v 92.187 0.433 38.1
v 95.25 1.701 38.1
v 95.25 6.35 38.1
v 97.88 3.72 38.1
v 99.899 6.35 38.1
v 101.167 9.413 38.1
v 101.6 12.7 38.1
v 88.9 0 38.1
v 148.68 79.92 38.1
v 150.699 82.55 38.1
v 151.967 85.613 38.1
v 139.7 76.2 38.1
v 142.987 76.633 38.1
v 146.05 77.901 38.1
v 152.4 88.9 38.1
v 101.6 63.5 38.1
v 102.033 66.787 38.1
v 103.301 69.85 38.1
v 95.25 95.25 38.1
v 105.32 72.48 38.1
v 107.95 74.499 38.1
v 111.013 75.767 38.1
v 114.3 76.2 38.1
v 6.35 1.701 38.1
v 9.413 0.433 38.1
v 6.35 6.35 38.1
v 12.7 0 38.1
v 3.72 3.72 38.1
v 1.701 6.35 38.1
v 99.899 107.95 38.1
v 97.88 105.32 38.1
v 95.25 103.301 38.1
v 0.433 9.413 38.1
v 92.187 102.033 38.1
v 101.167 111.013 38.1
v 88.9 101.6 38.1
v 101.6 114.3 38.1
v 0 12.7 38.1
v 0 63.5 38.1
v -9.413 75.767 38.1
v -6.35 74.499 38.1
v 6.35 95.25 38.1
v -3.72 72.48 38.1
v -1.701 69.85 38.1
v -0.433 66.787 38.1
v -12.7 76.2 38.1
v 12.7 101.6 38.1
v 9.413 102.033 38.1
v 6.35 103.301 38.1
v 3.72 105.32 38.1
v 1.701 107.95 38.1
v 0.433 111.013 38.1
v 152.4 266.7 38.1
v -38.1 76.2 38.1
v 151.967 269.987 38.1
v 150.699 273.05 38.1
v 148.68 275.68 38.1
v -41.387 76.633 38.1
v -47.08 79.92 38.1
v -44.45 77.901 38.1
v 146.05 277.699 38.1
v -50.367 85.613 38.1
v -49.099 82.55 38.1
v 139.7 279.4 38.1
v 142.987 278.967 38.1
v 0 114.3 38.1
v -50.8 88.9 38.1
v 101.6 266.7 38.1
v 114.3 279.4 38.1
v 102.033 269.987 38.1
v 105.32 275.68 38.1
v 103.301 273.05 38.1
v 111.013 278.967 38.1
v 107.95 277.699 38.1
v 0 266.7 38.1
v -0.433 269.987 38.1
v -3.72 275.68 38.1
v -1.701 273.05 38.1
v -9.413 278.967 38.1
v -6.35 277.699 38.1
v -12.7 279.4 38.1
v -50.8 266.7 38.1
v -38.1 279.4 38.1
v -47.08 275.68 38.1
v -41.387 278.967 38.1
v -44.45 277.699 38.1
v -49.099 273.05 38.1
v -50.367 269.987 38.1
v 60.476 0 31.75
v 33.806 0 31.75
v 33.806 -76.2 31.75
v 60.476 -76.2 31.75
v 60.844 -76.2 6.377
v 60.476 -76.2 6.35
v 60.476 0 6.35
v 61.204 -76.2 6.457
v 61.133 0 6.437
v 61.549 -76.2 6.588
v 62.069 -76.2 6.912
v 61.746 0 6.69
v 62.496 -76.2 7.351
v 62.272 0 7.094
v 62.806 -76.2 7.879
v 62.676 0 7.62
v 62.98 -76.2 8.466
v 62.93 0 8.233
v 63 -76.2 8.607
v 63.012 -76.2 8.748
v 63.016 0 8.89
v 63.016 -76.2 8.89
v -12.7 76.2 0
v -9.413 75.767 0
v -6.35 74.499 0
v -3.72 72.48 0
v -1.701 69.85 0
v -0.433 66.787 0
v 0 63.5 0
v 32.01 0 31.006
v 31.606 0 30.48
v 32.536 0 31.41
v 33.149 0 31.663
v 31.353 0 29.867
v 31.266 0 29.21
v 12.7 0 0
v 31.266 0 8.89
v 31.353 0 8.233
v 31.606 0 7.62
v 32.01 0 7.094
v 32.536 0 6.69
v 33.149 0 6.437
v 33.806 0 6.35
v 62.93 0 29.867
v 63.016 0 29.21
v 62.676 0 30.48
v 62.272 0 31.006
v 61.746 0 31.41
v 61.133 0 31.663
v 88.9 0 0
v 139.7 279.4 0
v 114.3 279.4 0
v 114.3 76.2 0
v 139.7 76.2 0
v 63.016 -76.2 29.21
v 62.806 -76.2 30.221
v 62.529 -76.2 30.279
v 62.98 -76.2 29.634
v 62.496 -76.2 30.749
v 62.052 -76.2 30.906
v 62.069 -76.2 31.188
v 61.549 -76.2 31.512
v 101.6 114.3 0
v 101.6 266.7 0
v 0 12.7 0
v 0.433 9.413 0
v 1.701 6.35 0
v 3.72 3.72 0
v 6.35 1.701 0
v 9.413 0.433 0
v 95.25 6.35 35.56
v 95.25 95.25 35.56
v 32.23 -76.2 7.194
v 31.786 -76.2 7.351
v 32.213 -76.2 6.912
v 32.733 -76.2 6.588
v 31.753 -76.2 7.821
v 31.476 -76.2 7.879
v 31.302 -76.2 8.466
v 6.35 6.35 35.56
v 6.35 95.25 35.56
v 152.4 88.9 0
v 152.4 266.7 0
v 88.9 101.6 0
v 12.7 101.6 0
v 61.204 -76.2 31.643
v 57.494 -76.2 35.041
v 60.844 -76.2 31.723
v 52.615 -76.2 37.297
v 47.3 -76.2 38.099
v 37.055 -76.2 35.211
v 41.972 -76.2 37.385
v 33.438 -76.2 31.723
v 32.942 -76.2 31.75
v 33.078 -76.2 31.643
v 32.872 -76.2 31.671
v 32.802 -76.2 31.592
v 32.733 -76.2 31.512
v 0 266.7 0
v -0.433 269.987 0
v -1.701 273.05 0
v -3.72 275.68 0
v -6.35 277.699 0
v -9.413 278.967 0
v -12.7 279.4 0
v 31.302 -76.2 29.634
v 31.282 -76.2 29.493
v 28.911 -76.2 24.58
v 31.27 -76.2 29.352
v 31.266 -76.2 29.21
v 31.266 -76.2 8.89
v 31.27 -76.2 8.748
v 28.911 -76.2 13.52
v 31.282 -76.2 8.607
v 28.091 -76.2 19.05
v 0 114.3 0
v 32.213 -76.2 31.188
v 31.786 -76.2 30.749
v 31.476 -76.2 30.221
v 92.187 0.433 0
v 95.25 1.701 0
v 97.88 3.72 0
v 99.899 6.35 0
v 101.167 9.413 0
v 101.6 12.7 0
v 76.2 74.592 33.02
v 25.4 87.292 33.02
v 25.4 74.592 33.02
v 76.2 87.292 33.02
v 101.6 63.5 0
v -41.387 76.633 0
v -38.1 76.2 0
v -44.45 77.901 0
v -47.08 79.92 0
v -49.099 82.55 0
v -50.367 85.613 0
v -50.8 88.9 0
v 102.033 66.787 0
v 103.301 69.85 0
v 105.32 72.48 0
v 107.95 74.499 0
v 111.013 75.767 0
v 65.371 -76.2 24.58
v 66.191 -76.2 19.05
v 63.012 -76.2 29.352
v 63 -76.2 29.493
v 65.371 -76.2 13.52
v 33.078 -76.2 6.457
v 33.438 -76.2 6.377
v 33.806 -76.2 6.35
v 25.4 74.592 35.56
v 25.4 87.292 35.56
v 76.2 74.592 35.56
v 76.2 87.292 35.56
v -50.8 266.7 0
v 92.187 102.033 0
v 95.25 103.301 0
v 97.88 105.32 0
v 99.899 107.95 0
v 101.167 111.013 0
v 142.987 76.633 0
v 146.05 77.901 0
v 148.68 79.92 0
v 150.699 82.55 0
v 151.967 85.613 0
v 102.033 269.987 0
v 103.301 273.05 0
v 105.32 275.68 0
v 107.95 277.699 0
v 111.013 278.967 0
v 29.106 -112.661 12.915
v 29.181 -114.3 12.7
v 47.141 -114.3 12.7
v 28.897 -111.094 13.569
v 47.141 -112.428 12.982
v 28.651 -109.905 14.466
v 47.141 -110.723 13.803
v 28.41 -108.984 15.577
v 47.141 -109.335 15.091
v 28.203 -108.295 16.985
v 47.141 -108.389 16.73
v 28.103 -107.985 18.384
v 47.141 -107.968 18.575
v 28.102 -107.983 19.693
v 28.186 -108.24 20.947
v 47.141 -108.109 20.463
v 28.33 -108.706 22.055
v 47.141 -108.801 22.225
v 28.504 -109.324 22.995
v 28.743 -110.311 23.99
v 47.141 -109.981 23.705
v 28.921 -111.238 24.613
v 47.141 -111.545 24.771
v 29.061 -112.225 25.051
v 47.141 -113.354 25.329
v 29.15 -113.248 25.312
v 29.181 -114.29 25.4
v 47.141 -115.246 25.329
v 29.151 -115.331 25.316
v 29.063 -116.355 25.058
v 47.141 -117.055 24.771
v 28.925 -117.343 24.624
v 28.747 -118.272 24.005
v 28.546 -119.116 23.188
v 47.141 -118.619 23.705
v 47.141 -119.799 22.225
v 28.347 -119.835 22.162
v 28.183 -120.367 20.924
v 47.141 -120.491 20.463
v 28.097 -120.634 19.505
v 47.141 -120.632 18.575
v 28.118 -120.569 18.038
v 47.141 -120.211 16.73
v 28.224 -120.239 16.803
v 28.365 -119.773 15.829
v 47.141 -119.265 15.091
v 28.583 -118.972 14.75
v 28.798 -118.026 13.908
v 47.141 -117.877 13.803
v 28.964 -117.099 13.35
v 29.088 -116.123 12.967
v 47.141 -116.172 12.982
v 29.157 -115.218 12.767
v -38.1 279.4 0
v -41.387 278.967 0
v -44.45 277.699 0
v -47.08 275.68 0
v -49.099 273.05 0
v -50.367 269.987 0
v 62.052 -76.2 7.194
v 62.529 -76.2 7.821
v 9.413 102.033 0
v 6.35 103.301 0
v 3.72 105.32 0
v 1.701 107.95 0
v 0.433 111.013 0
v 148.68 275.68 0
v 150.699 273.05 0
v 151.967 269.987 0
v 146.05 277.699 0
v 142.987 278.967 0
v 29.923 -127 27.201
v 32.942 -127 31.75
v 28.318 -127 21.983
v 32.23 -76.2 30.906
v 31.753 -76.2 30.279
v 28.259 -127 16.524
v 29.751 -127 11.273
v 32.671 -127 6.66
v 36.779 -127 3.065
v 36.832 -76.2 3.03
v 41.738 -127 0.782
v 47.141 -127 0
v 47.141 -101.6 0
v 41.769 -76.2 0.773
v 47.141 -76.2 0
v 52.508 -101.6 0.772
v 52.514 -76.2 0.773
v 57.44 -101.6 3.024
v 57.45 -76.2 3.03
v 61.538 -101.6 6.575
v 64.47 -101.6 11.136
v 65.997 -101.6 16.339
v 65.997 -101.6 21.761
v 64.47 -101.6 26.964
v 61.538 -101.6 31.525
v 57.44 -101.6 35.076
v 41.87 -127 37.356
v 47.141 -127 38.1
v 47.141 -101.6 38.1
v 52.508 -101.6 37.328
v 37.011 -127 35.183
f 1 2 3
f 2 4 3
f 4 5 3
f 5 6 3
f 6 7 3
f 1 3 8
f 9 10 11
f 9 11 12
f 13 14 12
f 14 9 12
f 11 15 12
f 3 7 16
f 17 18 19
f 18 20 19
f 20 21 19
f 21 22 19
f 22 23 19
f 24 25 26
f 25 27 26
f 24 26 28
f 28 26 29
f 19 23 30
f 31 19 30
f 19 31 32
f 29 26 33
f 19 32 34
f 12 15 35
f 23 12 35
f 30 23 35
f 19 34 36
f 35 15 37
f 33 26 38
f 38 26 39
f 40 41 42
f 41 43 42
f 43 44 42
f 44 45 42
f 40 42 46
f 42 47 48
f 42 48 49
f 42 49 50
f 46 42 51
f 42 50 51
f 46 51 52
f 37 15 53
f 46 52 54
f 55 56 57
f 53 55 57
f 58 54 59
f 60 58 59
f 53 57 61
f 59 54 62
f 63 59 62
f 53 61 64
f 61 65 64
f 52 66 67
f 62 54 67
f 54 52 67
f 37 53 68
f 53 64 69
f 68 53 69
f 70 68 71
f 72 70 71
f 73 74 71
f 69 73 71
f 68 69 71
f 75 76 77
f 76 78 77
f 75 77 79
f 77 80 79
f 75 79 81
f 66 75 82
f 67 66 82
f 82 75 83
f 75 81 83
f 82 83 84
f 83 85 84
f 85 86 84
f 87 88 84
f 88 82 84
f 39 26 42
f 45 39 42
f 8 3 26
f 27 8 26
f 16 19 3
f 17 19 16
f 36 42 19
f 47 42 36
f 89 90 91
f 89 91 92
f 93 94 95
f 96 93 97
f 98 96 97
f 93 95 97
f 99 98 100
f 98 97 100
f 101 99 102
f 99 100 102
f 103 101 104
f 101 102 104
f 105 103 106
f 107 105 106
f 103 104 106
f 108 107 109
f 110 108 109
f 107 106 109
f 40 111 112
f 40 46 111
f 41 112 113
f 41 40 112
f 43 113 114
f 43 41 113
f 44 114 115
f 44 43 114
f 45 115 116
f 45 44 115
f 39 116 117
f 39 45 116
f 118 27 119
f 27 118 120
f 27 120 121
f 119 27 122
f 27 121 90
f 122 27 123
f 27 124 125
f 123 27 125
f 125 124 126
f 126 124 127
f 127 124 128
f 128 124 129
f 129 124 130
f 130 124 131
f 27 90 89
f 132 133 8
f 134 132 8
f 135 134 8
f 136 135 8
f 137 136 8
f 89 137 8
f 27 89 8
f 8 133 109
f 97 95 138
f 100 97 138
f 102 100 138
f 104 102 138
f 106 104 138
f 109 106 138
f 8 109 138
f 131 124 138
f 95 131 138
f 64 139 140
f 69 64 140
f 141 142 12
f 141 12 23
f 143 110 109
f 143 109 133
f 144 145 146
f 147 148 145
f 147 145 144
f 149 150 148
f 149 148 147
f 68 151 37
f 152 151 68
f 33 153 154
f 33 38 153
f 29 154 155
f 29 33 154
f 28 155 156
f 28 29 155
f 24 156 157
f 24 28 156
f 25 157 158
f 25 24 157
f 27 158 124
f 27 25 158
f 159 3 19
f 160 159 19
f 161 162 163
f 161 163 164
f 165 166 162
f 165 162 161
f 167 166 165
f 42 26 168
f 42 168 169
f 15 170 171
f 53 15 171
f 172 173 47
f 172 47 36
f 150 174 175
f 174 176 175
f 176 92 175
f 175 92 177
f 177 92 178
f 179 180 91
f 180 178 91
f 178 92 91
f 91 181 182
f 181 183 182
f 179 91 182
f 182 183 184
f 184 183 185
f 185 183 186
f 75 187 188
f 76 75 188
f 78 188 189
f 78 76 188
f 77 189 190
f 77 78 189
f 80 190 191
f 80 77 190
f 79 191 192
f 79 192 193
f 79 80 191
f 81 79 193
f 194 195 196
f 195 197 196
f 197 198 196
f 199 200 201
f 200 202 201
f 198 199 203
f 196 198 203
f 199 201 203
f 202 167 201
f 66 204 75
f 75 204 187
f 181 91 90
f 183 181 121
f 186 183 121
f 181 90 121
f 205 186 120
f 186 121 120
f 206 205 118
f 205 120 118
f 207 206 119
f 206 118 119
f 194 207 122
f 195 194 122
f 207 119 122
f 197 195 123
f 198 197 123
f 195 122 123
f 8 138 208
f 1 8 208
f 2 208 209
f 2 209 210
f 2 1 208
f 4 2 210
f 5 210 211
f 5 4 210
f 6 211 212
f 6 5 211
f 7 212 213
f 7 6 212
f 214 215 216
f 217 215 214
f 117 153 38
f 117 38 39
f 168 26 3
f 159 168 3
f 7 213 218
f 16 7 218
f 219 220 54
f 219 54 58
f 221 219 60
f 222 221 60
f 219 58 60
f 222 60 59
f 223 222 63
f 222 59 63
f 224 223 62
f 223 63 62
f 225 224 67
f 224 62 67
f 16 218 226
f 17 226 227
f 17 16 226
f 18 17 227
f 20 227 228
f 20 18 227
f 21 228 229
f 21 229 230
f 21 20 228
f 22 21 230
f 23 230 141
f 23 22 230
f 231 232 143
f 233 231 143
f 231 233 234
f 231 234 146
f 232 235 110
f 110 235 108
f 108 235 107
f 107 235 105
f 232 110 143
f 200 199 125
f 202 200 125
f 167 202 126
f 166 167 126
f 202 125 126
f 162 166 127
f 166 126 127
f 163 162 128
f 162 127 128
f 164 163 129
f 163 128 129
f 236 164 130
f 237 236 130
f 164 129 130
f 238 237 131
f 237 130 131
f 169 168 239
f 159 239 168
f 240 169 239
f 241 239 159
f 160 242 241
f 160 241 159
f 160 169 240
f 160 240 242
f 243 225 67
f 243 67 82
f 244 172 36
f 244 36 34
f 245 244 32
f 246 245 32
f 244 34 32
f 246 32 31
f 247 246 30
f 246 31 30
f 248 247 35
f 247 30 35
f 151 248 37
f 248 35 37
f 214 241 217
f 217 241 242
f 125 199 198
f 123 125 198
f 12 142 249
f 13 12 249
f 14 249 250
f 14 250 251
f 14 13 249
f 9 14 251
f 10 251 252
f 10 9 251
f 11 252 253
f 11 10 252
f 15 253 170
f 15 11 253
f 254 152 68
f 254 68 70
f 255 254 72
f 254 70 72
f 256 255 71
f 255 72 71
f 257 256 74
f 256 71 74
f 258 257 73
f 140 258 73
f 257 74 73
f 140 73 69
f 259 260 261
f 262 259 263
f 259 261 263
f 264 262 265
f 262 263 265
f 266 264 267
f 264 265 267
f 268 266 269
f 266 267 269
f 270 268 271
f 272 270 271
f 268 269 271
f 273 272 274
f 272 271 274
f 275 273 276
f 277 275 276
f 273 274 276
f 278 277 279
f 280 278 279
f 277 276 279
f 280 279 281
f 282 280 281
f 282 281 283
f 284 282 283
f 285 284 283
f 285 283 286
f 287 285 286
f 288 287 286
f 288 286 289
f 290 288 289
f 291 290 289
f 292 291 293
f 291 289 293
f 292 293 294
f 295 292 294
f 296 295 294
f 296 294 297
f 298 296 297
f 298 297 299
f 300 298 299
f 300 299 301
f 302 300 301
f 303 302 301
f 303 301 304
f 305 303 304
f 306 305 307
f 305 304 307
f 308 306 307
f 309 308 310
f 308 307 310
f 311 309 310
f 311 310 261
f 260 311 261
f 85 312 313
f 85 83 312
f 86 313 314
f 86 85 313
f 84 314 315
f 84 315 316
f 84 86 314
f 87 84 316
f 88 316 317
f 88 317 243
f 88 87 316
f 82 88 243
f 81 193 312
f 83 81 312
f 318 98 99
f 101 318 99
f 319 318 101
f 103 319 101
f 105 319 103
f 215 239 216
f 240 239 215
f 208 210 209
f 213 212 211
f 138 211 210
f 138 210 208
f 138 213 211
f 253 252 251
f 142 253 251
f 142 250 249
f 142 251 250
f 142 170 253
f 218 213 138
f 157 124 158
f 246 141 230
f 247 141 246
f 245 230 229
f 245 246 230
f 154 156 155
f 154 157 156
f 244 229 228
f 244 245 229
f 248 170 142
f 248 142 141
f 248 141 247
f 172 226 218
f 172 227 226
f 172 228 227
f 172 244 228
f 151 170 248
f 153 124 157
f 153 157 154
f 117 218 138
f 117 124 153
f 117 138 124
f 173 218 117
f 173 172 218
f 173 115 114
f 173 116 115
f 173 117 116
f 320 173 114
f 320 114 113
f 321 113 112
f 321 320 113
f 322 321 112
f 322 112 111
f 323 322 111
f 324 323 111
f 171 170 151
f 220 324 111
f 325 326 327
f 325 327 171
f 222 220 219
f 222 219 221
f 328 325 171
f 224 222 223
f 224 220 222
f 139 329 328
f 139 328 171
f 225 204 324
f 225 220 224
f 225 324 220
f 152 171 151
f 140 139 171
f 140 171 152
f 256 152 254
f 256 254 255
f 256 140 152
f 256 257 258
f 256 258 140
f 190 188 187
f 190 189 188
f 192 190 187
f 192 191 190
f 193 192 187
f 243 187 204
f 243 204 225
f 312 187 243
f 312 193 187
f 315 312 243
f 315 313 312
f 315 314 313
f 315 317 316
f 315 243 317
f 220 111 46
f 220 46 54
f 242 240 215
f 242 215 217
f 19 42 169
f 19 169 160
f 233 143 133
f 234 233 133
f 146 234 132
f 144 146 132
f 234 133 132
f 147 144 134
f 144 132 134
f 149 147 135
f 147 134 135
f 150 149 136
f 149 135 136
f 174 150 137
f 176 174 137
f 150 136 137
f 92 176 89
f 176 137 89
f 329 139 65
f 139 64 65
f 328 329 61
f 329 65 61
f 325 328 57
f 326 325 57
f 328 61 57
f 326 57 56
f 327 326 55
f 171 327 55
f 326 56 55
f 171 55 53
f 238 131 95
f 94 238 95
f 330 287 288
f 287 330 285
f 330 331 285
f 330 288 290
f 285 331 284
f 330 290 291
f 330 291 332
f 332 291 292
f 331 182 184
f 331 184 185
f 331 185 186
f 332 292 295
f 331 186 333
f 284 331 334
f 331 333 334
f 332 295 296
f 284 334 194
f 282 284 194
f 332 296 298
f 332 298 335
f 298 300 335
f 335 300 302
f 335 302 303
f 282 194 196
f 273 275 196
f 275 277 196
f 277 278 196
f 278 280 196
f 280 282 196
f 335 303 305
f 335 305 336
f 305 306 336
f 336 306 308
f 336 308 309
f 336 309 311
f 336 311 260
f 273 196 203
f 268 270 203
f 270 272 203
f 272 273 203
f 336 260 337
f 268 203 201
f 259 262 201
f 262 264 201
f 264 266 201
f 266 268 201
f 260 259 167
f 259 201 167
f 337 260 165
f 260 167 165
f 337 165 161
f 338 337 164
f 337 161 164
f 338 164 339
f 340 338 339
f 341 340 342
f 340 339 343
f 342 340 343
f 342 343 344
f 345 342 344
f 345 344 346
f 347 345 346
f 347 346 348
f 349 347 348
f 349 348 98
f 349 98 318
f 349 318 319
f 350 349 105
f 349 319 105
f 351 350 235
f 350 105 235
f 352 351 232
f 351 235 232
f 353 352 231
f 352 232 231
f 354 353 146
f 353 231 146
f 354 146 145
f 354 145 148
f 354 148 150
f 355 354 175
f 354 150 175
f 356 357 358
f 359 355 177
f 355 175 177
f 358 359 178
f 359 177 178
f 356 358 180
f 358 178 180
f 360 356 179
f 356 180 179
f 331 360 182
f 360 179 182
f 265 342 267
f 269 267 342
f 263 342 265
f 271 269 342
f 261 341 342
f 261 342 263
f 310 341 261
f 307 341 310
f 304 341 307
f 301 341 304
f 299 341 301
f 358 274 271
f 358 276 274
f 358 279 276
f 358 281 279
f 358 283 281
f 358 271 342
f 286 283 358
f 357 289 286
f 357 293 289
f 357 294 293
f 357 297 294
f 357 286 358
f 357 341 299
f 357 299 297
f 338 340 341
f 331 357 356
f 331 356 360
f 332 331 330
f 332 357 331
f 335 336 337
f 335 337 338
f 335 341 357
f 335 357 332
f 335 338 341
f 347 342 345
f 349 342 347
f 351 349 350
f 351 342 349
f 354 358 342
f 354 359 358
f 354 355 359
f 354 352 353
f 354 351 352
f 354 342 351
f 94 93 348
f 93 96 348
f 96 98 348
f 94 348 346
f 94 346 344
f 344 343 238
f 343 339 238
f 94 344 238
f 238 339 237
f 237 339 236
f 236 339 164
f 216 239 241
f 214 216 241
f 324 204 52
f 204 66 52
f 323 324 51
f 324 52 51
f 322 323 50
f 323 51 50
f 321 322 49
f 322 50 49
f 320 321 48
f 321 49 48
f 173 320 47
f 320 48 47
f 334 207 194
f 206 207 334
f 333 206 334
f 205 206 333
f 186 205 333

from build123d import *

# Parameters (mm, degrees)
SKETCH1_W           = 101.6
SKETCH1_H           = 101.6
BOSS_EXTRUDE1_DEPTH = 38.1
SKETCH2_W           = 50.8
SKETCH2_H           = 12.7
CUT_EXTRUDE1_DEPTH  = 5.08
SKETCH3_W           = 88.9
SKETCH3_H           = 88.9
CUT_EXTRUDE2_DEPTH  = 2.54
SKETCH4_W           = 31.75
SKETCH4_H           = 25.4
BOSS_EXTRUDE2_DEPTH = 76.2
SKETCH6_R           = 19.05
BOSS_EXTRUDE3_DEPTH = 50.8
SKETCH7_W           = 24.863041021
SKETCH7_H           = 49.917211664
CUT_EXTRUDE3_DEPTH  = 25.4
SKETCH8_W           = 50.8
SKETCH8_H           = 203.2
BOSS_EXTRUDE4_DEPTH = 38.1
FILLET1_R           = 12.7
SKETCH9_R           = 6.35
CUT_EXTRUDE4_DEPTH  = 301.990708903
FILLET2_R           = 2.54


with BuildPart() as part:
    # Sketch1 → Boss-Extrude1 (new body)
    with BuildSketch(Plane.XY):
        with Locations((50.8, 50.8)):
            Rectangle(SKETCH1_W, SKETCH1_H)
    extrude(amount=BOSS_EXTRUDE1_DEPTH)

    # Sketch2 → Cut-Extrude1 (cut)
    with BuildSketch(Plane.XY.offset(38.1)):
        with Locations((50.8, 80.942159742)):
            Rectangle(SKETCH2_W, SKETCH2_H)
    extrude(amount=-CUT_EXTRUDE1_DEPTH, mode=Mode.SUBTRACT)

    # Sketch3 → Cut-Extrude2 (cut)
    with BuildSketch(Plane.XY.offset(38.1)):
        with Locations((50.8, 50.8)):
            Rectangle(SKETCH3_W, SKETCH3_H)
    extrude(amount=-CUT_EXTRUDE2_DEPTH, mode=Mode.SUBTRACT)

    # Sketch4 → Boss-Extrude2 (add)
    with BuildSketch(Plane.XZ):
        with Locations((47.141096121, 19.05)):
            Rectangle(SKETCH4_W, SKETCH4_H)
    extrude(amount=BOSS_EXTRUDE2_DEPTH)

    # Sketch6 → Boss-Extrude3 (add)
    with BuildSketch(Plane.XZ.offset(76.2)):
        with Locations(Location((47.141096121, 19.05, 0), (0, 0, 138.189685104))):
            Circle(SKETCH6_R)
    extrude(amount=BOSS_EXTRUDE3_DEPTH)

    # Sketch7 → Cut-Extrude3 (cut)
    with BuildSketch(Plane.XZ.offset(127)):
        with Locations((59.572616632, 20.72754322)):
            Rectangle(SKETCH7_W, SKETCH7_H)
    extrude(amount=-CUT_EXTRUDE3_DEPTH, mode=Mode.SUBTRACT)

    # Sketch8 → Boss-Extrude4 (add)
    with BuildSketch(Plane(origin=(0, 0, 0), x_dir=(-1, 0, 0), z_dir=(0, 0, -1))):
        with Locations((25.4, 177.8)):
            Rectangle(SKETCH8_W, SKETCH8_H)
        with Locations((-127, 177.8)):
            Rectangle(SKETCH8_W, SKETCH8_H)
    extrude(amount=-BOSS_EXTRUDE4_DEPTH)

    # Fillet1
    fillet1_edges = [part.edges().sort_by_distance(p)[0] for p in [
        (101.6, 0, 19.05),
        (0, 0, 19.05),
        (0, 76.2, 19.05),
        (101.6, 76.2, 19.05),
        (101.6, 101.6, 19.05),
        (0, 101.6, 19.05),
        (152.4, 76.2, 19.05),
        (-50.8, 76.2, 19.05),
        (-50.8, 279.4, 19.05),
        (101.6, 279.4, 19.05),
        (152.4, 279.4, 19.05),
        (0, 279.4, 19.05),
    ]]
    fillet(fillet1_edges, radius=FILLET1_R)

    # Sketch9 → Cut-Extrude4 (cut, through all)
    with BuildSketch(Plane(origin=(47.141096121, 0, 0), x_dir=(0, 0, -1), z_dir=(1, 0, 0))):
        with Locations((-19.05, -114.3)):
            Circle(SKETCH9_R)
    extrude(amount=-CUT_EXTRUDE4_DEPTH, mode=Mode.SUBTRACT)

    # Fillet2
    # the kernel refuses this fillet: 2.54 mm, written as the material it takes off along each edge
    with BuildSketch(Plane(origin=(31.266096121, 0, 31.75), x_dir=(1, 0, 0), z_dir=(0, -1, 0))) as fillet2_piece_1:
        with BuildLine():
            CenterArc((FILLET2_R, -FILLET2_R), FILLET2_R, 90, 90)
            Line((0, -FILLET2_R), (0, 0))
            Line((0, 0), (FILLET2_R, 0))
        make_face()
    extrude(amount=76.2, mode=Mode.SUBTRACT)
    with BuildSketch(Plane(origin=(31.266096121, 0, 6.35), x_dir=(1, 0, 0), z_dir=(0, -1, 0)), Plane(origin=(63.016096121, 0, 6.35), x_dir=(0, 0, 1), z_dir=(0, -1, 0)), Plane(origin=(63.016096121, 0, 31.75), x_dir=(-1, 0, 0), z_dir=(0, -1, 0))) as fillet2_piece_2:
        with BuildLine():
            CenterArc((FILLET2_R, FILLET2_R), FILLET2_R, 180, 90)
            Line((0, FILLET2_R), (0, 0))
            Line((0, 0), (FILLET2_R, 0))
        make_face()
    extrude(amount=76.2, mode=Mode.SUBTRACT)


solid = part.part
